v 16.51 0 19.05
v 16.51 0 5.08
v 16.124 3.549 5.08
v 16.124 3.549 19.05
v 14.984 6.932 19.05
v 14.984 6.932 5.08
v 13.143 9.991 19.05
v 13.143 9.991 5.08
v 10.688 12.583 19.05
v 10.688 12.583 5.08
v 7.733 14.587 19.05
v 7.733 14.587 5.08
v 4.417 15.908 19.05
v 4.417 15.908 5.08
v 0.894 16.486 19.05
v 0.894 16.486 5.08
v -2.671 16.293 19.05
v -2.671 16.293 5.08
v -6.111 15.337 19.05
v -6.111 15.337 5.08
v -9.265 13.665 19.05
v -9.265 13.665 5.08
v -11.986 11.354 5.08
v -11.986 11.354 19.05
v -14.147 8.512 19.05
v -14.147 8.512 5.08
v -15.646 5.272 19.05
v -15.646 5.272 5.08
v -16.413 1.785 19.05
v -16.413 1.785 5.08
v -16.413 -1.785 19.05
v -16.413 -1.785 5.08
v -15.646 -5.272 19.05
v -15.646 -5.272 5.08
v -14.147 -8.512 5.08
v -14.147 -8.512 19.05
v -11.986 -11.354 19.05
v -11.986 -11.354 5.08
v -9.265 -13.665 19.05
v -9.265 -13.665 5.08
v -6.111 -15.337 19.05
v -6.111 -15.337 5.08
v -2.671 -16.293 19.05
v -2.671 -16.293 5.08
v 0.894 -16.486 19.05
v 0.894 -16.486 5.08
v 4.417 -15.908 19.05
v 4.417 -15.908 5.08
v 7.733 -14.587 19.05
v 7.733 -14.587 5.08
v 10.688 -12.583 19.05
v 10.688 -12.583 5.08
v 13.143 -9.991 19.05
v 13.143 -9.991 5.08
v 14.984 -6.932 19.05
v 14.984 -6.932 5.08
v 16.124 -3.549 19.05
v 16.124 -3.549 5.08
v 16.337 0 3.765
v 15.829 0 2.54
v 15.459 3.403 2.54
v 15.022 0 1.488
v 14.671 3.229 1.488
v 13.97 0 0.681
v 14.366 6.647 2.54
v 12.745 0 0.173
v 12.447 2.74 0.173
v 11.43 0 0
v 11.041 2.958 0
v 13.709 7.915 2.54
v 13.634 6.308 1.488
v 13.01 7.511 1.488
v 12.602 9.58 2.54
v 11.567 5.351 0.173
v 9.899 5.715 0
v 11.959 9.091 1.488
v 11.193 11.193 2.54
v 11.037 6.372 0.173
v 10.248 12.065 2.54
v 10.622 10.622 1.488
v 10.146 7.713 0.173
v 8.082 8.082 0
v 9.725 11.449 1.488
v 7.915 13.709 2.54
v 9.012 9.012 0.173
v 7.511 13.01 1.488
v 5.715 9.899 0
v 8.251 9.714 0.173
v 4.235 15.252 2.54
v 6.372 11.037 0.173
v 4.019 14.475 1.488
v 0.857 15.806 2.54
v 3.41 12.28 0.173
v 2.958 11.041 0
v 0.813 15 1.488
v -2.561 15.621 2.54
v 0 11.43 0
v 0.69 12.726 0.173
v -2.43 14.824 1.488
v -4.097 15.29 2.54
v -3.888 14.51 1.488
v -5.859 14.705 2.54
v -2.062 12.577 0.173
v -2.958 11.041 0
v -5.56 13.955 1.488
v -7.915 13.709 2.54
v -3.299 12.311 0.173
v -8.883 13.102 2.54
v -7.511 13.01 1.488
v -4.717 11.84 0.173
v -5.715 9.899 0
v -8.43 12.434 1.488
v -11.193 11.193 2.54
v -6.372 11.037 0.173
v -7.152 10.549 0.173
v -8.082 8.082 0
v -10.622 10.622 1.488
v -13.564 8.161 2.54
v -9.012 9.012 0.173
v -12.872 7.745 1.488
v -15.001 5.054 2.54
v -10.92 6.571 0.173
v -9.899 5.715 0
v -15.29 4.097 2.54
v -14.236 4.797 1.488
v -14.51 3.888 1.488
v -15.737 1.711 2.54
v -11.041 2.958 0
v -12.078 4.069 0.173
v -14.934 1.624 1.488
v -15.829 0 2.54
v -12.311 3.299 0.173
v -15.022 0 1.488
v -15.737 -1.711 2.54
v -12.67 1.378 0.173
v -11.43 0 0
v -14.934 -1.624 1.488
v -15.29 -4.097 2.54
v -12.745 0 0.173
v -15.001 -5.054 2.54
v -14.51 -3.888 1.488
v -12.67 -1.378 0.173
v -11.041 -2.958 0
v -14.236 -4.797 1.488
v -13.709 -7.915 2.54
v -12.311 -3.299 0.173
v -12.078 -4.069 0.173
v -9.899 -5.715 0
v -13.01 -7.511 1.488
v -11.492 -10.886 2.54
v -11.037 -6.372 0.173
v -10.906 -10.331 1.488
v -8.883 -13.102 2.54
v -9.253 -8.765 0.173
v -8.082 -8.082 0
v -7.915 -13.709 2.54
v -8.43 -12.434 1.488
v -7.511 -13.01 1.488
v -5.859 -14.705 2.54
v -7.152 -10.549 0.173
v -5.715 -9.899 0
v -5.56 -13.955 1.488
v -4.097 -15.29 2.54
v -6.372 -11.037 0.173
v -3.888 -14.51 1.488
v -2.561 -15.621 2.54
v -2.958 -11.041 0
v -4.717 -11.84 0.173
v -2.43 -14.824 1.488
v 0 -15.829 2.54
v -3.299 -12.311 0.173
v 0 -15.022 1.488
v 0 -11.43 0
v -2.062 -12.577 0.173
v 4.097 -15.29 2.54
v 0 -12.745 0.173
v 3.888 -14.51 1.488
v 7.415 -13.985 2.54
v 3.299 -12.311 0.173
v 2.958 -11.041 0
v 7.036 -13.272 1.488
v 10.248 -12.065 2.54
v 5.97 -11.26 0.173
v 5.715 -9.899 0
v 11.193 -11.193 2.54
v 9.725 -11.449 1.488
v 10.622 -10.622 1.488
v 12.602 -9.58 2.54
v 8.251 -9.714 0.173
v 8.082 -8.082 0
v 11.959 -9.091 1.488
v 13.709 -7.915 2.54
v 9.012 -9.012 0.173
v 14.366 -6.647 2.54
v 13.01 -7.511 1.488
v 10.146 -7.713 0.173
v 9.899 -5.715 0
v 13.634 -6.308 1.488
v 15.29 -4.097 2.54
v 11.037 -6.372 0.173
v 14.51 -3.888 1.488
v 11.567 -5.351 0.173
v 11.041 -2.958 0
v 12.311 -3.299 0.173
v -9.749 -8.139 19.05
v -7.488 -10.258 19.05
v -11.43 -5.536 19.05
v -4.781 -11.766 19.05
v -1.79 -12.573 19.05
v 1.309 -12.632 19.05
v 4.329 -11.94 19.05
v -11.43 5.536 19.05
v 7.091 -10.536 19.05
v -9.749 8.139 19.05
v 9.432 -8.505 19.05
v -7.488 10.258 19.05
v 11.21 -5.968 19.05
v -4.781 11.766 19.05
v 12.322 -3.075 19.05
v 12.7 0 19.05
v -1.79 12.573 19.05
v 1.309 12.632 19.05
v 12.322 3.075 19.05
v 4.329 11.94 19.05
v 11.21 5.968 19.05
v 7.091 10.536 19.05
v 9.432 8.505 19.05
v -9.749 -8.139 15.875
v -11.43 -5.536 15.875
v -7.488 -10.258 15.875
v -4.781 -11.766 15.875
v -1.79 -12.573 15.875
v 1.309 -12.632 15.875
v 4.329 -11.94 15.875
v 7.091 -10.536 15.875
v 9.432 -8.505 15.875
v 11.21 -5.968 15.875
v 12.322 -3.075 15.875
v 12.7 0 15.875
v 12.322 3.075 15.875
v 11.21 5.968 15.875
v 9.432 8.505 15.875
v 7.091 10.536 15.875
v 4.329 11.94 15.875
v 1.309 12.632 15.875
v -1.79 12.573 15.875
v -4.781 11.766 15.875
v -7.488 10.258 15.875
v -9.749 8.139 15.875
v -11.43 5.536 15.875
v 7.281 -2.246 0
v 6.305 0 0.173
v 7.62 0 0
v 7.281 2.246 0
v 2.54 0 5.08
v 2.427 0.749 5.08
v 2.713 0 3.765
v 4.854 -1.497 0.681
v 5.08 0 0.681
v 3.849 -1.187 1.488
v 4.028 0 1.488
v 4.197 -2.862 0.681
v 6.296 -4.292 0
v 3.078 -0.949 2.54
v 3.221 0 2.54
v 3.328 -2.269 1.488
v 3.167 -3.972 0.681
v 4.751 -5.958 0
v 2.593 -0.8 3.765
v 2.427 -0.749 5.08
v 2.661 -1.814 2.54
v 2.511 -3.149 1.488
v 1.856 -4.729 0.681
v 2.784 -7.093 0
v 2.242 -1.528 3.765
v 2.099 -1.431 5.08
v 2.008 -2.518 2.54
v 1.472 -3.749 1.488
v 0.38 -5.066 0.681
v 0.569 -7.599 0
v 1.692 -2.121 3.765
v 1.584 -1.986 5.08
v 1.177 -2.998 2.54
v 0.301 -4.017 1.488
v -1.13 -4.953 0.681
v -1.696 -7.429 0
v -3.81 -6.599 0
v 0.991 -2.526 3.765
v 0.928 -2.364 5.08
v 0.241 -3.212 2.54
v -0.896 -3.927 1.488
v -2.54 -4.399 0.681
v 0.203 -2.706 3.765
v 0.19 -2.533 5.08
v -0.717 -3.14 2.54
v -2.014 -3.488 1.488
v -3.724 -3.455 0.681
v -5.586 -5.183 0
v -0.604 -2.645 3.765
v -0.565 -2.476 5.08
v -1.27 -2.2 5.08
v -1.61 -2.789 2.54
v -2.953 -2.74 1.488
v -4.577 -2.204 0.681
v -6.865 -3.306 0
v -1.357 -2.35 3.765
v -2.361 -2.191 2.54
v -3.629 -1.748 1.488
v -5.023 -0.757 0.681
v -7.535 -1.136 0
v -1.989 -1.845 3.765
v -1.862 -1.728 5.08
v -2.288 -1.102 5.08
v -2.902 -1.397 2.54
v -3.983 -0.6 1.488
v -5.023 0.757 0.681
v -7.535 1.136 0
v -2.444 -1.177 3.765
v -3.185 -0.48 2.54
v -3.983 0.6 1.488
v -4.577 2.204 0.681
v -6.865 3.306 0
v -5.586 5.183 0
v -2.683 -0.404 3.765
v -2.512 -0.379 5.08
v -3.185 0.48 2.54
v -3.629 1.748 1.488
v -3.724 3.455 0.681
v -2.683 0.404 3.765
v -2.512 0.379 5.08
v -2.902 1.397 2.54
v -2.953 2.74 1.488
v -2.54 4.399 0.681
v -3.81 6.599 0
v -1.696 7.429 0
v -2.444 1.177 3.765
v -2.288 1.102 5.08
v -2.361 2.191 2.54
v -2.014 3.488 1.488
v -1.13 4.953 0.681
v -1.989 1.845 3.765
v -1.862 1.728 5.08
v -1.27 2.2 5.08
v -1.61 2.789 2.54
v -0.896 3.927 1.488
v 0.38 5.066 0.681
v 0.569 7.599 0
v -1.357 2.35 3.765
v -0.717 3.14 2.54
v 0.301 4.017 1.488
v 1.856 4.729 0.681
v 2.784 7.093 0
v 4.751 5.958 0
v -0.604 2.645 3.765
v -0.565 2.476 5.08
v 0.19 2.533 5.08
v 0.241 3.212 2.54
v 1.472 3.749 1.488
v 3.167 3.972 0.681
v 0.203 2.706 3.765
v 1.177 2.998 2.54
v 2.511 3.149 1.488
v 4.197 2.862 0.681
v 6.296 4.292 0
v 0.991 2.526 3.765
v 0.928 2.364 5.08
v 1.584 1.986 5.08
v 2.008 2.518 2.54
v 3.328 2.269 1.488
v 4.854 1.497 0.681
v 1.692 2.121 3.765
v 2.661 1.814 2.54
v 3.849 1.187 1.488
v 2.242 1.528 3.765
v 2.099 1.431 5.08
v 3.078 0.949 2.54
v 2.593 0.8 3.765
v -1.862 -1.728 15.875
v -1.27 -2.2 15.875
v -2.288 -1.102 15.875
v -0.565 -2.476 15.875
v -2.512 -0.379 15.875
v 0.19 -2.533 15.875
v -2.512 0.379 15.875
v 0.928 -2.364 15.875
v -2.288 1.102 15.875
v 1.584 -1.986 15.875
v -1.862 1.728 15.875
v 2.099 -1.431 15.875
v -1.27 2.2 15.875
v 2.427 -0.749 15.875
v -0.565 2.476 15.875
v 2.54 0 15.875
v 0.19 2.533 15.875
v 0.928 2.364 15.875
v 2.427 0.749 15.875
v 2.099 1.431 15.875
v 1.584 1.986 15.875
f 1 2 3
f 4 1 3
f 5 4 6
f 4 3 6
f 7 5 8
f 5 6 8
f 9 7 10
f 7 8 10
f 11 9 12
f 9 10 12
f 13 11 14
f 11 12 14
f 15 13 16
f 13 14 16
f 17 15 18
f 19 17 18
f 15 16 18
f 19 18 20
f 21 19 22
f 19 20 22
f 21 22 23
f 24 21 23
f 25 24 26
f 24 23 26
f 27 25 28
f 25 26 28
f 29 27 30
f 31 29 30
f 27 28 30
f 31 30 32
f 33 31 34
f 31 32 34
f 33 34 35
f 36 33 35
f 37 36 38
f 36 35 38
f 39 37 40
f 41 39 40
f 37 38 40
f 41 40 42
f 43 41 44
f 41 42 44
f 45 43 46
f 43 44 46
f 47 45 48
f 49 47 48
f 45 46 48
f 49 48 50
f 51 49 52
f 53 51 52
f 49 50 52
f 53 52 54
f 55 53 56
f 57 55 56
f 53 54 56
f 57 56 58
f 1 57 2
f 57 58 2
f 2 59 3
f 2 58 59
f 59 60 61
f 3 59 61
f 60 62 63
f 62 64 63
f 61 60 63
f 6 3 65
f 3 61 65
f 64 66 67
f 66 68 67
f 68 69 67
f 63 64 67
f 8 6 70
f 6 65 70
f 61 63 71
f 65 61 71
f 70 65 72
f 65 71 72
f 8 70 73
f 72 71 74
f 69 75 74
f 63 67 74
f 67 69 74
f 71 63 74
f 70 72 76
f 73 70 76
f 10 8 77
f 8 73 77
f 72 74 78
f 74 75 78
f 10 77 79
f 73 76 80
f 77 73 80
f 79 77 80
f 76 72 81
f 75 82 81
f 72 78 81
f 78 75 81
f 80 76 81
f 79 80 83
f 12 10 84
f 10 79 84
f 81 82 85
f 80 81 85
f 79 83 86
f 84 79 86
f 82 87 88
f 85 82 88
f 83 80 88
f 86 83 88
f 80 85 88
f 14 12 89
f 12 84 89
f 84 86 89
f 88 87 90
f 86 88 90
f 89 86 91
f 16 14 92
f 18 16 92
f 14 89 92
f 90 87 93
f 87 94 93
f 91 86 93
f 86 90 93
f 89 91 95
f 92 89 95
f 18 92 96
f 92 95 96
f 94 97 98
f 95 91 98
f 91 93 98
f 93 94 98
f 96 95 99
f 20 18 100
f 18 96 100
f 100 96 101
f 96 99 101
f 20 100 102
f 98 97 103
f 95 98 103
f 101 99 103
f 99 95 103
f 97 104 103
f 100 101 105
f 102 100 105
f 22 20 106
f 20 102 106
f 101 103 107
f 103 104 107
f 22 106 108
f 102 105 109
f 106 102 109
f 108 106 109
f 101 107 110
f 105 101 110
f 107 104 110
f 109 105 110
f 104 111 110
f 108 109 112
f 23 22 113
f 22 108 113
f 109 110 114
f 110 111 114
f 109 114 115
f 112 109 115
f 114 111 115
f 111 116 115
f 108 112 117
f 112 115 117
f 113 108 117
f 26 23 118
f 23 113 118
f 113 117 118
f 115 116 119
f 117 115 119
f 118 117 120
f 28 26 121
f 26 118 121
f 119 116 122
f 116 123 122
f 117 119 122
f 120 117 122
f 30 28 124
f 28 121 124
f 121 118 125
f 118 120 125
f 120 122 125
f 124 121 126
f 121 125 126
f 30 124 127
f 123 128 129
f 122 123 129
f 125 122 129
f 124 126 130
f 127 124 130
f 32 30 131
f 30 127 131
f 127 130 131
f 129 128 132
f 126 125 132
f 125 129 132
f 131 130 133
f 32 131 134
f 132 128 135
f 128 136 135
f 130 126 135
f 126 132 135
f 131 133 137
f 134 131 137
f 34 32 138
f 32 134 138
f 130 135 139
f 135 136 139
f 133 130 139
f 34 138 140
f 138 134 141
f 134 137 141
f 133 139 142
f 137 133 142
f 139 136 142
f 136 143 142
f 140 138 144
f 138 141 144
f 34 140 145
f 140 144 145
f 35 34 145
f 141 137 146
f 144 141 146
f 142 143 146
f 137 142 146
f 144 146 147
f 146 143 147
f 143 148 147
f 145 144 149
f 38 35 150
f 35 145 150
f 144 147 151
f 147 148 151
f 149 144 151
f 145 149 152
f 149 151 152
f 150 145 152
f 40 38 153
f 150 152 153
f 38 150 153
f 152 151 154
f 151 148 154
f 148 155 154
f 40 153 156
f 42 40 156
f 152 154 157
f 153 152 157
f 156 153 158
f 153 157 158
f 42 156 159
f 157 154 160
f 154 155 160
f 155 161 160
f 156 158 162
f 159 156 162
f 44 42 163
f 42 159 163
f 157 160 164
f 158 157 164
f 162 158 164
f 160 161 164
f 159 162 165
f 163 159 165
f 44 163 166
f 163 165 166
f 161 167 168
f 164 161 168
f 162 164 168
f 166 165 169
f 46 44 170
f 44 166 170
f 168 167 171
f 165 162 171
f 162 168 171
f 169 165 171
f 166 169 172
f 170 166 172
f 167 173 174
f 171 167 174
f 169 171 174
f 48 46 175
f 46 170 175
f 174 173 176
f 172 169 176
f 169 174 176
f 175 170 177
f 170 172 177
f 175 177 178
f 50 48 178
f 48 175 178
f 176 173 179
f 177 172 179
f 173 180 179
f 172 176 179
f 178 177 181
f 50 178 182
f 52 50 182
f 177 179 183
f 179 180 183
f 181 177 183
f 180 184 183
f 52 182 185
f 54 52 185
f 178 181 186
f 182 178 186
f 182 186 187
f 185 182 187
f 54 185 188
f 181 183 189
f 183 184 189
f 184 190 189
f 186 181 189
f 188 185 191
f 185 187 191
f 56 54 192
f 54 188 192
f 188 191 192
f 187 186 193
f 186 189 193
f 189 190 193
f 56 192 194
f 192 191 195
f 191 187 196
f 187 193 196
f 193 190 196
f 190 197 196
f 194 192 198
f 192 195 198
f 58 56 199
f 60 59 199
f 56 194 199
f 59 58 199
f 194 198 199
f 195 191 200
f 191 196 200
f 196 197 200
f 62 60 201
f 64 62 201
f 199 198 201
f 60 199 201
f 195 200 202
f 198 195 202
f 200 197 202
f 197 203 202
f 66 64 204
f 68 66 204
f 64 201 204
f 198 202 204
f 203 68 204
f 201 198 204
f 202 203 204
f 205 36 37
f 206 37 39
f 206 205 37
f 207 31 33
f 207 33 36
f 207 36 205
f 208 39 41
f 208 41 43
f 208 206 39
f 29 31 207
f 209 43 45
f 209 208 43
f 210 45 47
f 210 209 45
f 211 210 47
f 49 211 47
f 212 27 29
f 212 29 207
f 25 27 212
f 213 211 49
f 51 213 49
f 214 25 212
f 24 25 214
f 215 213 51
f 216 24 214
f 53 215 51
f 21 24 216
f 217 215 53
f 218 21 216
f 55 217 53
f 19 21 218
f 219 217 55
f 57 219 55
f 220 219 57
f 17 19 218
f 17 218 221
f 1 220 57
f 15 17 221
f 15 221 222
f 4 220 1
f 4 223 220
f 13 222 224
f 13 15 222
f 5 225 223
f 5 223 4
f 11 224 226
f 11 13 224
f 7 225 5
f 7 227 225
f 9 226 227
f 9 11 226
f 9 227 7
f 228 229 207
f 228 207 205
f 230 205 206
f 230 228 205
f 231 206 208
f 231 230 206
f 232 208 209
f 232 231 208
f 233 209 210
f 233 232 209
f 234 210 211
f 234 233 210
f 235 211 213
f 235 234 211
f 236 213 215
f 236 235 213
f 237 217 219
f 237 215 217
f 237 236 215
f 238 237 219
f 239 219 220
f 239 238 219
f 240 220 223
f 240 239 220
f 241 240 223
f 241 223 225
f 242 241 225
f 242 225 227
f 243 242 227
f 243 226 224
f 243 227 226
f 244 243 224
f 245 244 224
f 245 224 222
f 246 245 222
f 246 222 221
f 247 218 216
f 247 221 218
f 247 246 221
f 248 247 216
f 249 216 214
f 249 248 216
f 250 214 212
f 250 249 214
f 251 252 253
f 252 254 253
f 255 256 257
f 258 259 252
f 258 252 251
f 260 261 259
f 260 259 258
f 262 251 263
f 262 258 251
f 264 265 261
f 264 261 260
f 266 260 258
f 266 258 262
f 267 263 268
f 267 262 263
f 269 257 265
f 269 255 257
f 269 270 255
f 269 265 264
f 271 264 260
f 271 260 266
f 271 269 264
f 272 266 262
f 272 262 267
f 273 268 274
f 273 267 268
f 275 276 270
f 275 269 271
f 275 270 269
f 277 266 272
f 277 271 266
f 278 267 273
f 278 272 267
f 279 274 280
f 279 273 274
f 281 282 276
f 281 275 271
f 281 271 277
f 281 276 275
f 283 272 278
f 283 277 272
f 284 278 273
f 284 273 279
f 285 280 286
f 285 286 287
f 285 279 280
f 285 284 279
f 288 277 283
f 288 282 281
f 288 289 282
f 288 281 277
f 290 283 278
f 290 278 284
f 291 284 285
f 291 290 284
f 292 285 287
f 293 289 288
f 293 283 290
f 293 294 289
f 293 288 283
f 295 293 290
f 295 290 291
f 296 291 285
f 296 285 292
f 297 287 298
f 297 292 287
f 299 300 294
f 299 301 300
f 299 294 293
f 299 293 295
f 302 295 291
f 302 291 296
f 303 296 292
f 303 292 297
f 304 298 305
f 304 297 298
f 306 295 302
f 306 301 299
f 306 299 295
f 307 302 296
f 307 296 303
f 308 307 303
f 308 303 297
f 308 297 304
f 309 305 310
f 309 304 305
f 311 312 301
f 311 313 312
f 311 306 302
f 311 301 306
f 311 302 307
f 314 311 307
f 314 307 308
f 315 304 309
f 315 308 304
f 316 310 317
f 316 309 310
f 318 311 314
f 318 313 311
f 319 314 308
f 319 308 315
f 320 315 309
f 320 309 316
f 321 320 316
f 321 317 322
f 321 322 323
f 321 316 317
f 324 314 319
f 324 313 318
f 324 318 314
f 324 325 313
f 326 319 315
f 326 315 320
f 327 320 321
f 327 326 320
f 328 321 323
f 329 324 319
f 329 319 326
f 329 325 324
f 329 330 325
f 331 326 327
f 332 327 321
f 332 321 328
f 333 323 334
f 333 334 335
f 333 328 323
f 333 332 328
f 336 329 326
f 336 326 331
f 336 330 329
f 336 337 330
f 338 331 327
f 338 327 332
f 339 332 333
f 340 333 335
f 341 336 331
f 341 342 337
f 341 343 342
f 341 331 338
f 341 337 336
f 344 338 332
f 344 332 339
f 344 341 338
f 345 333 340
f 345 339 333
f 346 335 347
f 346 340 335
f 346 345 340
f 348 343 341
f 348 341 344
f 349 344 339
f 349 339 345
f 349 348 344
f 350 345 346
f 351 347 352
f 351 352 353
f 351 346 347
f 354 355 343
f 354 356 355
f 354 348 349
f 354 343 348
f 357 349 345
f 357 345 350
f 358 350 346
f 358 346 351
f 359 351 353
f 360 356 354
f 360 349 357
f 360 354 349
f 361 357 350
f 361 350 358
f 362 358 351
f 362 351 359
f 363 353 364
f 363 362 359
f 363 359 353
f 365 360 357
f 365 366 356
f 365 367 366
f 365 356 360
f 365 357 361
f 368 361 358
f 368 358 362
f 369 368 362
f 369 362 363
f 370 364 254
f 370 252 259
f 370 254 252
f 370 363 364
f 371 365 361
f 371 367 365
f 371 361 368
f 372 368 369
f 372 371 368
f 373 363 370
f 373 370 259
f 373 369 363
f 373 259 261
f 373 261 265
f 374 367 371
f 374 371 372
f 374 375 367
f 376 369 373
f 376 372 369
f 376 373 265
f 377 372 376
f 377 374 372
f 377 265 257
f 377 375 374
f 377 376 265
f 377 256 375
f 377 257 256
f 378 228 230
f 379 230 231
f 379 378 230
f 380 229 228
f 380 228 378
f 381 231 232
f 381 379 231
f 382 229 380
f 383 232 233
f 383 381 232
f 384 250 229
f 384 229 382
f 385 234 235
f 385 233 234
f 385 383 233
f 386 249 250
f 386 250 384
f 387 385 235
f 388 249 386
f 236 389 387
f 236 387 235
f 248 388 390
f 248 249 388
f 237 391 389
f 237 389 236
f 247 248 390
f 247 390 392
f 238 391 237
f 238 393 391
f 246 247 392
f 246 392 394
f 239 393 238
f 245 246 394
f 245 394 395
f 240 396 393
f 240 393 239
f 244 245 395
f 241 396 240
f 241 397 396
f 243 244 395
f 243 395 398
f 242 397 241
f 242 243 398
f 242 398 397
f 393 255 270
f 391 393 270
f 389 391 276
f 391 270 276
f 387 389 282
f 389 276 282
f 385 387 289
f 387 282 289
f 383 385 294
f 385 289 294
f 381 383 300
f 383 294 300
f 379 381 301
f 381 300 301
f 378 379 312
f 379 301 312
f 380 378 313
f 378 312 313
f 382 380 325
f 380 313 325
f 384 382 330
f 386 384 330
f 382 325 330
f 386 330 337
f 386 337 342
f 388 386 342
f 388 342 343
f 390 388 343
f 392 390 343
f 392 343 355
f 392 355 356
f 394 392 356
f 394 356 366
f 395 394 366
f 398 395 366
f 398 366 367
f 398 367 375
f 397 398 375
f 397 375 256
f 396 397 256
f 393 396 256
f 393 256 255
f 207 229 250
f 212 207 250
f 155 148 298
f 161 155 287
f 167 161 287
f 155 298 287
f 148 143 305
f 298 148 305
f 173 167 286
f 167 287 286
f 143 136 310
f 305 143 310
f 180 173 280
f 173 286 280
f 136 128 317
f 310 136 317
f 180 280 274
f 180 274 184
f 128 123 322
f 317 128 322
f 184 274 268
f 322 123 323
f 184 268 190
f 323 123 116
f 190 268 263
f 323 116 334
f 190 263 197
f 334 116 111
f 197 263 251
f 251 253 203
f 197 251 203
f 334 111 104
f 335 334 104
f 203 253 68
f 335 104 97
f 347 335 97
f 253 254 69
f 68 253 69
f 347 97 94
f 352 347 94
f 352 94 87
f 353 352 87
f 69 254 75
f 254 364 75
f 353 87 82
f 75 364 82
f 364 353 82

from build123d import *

# Parameters (mm, degrees)
F0_R     = 12.7
F1_DEPTH = 15.875
F0_R_2   = 16.51
F2_DEPTH = 19.05
F4_DEPTH = 3.175
F5_R     = 2.54
F6_DEPTH = 19.051
F7_R     = 5.08


with BuildPart() as f1:
    # F0 (on Top) → F1 (new body)
    with BuildSketch(Plane.XY):
        Circle(F0_R)
    extrude(amount=F1_DEPTH)

    # F0 (on Top) → F2 (join)
    with BuildSketch(Plane.XY):
        Circle(F0_R_2)
        Circle(F0_R, mode=Mode.SUBTRACT)
    extrude(amount=F2_DEPTH)

    # F3 (on face) → F4 (join, through all)
    with BuildSketch(Plane.XY.offset(15.875)):
        with BuildLine():
            Line((-11.43, -5.535802), (-11.43, 5.535802))
            ThreePointArc((-11.43, 5.535802), (-12.7, 0), (-11.43, -5.535802))
        make_face()
    extrude(amount=F4_DEPTH)

    # F5 (on face) → F6 (cut, through all)
    with BuildSketch(Plane(origin=(0, 0, 0), x_dir=(1, 0, 0), z_dir=(0, 0, -1))):
        Circle(F5_R)
    extrude(amount=-F6_DEPTH, mode=Mode.SUBTRACT)

    # F7
    f7_edges = [f1.edges().sort_by_distance(p)[0] for p in [
        (-16.51, 0, 0),
        (-2.54, 0, 0),
    ]]
    fillet(f7_edges, radius=F7_R)


solid = f1.part
